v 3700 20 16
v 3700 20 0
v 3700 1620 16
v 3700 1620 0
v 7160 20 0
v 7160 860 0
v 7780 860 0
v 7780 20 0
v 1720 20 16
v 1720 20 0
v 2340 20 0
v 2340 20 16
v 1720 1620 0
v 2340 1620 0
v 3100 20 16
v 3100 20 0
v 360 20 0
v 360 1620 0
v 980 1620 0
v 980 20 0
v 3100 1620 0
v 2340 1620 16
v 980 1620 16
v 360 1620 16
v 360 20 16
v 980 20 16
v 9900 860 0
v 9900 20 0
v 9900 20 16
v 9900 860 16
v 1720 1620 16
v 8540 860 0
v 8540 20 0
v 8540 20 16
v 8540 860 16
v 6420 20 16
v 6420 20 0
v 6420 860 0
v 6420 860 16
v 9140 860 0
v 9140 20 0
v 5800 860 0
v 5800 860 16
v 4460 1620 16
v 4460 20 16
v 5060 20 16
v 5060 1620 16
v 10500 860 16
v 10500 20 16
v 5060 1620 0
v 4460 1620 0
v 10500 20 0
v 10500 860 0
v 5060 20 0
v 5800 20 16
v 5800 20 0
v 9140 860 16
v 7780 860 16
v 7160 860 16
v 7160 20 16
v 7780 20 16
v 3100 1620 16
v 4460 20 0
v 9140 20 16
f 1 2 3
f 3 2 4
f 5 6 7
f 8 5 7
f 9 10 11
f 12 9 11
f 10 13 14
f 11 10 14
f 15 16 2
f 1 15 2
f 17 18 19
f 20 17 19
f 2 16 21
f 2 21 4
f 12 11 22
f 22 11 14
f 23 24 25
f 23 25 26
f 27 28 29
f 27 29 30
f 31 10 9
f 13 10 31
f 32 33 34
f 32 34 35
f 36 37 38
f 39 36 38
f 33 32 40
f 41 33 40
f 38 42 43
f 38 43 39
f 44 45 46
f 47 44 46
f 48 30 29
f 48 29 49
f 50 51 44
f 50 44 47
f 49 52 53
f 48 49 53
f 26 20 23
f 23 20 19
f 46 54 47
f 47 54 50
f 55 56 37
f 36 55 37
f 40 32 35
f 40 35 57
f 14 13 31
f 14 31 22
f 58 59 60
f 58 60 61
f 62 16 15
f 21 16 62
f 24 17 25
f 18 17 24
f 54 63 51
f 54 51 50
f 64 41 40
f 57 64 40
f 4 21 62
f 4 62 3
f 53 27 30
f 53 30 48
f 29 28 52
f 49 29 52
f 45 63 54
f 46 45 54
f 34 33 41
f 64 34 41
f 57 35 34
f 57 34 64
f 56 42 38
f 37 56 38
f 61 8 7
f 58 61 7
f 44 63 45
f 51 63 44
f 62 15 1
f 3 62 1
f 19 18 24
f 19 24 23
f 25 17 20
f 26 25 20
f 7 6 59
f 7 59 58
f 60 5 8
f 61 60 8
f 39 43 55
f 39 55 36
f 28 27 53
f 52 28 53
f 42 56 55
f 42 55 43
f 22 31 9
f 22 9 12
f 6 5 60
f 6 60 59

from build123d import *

# Parameters (mm, degrees)
F1_W     = 620
F1_H     = 1600
F1_W_2   = 600
F1_H_2   = 840
F2_DEPTH = 16


with BuildPart() as f2:
    # F1 (on Top) → F2 (new body)
    with BuildSketch(Plane.XY):
        with Locations((670, 820)):
            Rectangle(F1_W, F1_H)
        with Locations((2030, 820)):
            Rectangle(F1_W, F1_H)
        with Locations((3400, 820)):
            Rectangle(F1_W_2, F1_H)
        with Locations((4760, 820)):
            Rectangle(F1_W_2, F1_H)
        with Locations((6110, 440)):
            Rectangle(F1_W, F1_H_2)
        with Locations((7470, 440)):
            Rectangle(F1_W, F1_H_2)
        with Locations((8840, 440)):
            Rectangle(F1_W_2, F1_H_2)
        with Locations((10200, 440)):
            Rectangle(F1_W_2, F1_H_2)
    extrude(amount=F2_DEPTH)


solid = f2.part
